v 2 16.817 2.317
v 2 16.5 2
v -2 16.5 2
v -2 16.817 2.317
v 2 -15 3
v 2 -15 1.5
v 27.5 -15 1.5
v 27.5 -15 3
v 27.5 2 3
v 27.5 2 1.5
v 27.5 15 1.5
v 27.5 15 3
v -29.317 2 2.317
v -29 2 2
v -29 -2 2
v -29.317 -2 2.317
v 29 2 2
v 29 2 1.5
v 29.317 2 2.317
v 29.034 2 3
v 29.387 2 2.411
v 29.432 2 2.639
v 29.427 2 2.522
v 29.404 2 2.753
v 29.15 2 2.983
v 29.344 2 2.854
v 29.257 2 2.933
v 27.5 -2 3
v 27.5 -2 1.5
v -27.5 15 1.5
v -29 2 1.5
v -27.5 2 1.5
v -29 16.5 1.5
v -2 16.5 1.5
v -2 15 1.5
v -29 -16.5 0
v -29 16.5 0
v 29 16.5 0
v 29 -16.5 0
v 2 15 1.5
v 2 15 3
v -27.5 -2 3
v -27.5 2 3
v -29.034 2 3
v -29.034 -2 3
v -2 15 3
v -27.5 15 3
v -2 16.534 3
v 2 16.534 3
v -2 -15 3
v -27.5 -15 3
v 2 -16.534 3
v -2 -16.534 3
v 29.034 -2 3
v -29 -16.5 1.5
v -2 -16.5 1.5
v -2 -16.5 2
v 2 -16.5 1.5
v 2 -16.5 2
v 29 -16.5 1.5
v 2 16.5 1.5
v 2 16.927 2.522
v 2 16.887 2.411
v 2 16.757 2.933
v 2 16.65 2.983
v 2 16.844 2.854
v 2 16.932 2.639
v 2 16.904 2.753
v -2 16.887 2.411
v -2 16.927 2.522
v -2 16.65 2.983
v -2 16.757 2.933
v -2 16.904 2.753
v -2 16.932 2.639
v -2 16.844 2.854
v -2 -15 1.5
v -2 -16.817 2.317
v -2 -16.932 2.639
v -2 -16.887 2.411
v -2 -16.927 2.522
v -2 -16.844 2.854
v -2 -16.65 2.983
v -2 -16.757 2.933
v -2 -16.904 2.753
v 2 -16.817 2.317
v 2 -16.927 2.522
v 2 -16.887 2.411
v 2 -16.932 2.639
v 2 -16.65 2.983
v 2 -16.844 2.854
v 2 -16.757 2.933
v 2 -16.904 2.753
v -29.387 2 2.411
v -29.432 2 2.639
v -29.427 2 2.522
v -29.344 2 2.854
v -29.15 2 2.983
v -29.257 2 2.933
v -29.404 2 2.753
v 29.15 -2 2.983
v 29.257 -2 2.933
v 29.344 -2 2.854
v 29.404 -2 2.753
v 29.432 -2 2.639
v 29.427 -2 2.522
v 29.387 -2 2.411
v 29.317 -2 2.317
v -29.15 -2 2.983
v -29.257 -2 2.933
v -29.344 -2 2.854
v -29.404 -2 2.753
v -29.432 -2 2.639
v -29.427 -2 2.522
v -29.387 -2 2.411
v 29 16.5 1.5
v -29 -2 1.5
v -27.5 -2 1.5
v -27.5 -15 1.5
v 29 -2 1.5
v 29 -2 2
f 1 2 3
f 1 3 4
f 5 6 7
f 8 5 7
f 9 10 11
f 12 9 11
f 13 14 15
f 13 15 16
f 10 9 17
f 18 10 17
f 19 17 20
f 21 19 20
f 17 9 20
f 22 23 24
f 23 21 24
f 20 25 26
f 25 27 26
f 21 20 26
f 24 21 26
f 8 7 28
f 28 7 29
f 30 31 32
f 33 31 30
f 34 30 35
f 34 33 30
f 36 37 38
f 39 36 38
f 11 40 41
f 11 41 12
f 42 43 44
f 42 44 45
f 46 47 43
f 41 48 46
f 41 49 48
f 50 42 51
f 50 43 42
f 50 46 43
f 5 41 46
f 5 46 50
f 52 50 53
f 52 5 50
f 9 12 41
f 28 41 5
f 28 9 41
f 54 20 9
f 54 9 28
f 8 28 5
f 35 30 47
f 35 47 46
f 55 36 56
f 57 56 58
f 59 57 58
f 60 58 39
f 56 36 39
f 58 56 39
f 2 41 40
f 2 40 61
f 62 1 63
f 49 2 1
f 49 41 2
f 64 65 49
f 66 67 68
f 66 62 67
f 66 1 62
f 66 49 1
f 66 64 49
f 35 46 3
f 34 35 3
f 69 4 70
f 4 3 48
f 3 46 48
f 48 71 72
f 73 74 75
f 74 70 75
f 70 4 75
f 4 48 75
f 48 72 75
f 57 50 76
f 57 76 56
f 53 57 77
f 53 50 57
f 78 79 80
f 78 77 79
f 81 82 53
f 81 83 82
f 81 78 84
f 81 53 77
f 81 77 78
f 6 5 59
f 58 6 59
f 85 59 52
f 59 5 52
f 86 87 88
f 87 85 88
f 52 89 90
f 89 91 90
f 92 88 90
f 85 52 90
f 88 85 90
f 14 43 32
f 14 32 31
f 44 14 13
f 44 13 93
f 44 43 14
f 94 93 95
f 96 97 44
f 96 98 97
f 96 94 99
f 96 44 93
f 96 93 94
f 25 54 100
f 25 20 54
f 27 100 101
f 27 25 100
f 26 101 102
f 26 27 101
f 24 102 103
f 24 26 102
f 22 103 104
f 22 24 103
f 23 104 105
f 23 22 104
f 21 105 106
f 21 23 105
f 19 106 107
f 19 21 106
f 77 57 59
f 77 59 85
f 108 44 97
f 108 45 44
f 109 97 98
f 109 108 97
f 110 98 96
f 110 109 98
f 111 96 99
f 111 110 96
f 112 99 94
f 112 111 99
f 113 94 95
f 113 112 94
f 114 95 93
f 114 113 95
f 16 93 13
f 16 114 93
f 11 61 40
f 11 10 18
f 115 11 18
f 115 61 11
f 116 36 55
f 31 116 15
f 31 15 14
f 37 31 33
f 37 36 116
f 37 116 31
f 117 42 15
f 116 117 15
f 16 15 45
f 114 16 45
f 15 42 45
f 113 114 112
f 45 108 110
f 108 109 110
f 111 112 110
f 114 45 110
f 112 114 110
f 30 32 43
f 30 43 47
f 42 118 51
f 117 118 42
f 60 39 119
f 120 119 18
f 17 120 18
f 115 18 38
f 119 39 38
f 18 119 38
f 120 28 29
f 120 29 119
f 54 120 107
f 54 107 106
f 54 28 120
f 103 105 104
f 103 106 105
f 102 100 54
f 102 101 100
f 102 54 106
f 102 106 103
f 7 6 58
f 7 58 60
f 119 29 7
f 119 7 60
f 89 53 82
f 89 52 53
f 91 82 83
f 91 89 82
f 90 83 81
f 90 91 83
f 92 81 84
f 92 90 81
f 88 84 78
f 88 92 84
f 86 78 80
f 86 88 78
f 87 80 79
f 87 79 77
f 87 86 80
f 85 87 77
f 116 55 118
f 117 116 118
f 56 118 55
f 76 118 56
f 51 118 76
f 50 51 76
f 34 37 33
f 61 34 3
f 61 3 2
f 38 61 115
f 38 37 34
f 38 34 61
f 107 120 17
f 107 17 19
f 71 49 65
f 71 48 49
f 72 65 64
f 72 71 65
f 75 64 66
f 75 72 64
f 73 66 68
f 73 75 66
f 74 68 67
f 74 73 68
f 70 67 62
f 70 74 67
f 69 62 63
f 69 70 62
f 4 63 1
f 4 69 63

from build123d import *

# Parameters (mm, degrees)
F0_W      = 58
F0_H      = 33
F1_DEPTH  = 1.5
F2_W      = 55
F2_H      = 30
F3_DEPTH  = 1.5
F4_W      = 1.5
F4_H      = 4
F4_W_2    = 4
F4_H_2    = 1.5
F5_DEPTH  = 1.5
F7_DEPTH  = 4
F9_DEPTH  = 4
F11_DEPTH = 4
F13_DEPTH = 4
F14_R     = 0.4


with BuildPart() as f1:
    # F0 (on Top) → F1 (new body)
    with BuildSketch(Plane.XY):
        Rectangle(F0_W, F0_H)
    extrude(amount=F1_DEPTH)

    # F2 (on face) → F3 (join)
    with BuildSketch(Plane.XY.offset(1.5)):
        Rectangle(F2_W, F2_H)
    extrude(amount=F3_DEPTH)

    # F4 (on face) → F5 (join)
    with BuildSketch(Plane.XY.offset(1.5)):
        with Locations((-28.25, 0)):
            Rectangle(F4_W, F4_H)
        with Locations((0, 15.75)):
            Rectangle(F4_W_2, F4_H_2)
        with Locations((28.25, 0)):
            Rectangle(F4_W, F4_H)
        with Locations((0, -15.75)):
            Rectangle(F4_W_2, F4_H_2)
    extrude(amount=F5_DEPTH)

    # F6 (on face) → F7 (join)
    with BuildSketch(Plane(origin=(-2, 0, 0), x_dir=(0, -1, 0), z_dir=(-1, 0, 0))):
        Polygon((17.5, 3), (16.5, 3), (16.5, 2), align=None)
    extrude(amount=-F7_DEPTH)

    # F8 (on face) → F9 (join)
    with BuildSketch(Plane(origin=(0, 2, 0), x_dir=(-1, 0, 0), z_dir=(0, 1, 0))):
        Polygon((30, 3), (29, 3), (29, 2), align=None)
    extrude(amount=-F9_DEPTH)

    # F10 (on face) → F11 (join)
    with BuildSketch(Plane.XZ.offset(2)):
        Polygon((30, 3), (29, 3), (29, 2), align=None)
    extrude(amount=-F11_DEPTH)

    # F12 (on face) → F13 (join)
    with BuildSketch(Plane.YZ.offset(2)):
        Polygon((17.5, 3), (16.5, 3), (16.5, 2), align=None)
    extrude(amount=-F13_DEPTH)

    # F14
    f14_edges = [f1.edges().sort_by_distance(p)[0] for p in [
        (-30, 0, 3),
        (0, 17.5, 3),
        (30, 0, 3),
        (0, -17.5, 3),
    ]]
    fillet(f14_edges, radius=F14_R)


solid = f1.part
